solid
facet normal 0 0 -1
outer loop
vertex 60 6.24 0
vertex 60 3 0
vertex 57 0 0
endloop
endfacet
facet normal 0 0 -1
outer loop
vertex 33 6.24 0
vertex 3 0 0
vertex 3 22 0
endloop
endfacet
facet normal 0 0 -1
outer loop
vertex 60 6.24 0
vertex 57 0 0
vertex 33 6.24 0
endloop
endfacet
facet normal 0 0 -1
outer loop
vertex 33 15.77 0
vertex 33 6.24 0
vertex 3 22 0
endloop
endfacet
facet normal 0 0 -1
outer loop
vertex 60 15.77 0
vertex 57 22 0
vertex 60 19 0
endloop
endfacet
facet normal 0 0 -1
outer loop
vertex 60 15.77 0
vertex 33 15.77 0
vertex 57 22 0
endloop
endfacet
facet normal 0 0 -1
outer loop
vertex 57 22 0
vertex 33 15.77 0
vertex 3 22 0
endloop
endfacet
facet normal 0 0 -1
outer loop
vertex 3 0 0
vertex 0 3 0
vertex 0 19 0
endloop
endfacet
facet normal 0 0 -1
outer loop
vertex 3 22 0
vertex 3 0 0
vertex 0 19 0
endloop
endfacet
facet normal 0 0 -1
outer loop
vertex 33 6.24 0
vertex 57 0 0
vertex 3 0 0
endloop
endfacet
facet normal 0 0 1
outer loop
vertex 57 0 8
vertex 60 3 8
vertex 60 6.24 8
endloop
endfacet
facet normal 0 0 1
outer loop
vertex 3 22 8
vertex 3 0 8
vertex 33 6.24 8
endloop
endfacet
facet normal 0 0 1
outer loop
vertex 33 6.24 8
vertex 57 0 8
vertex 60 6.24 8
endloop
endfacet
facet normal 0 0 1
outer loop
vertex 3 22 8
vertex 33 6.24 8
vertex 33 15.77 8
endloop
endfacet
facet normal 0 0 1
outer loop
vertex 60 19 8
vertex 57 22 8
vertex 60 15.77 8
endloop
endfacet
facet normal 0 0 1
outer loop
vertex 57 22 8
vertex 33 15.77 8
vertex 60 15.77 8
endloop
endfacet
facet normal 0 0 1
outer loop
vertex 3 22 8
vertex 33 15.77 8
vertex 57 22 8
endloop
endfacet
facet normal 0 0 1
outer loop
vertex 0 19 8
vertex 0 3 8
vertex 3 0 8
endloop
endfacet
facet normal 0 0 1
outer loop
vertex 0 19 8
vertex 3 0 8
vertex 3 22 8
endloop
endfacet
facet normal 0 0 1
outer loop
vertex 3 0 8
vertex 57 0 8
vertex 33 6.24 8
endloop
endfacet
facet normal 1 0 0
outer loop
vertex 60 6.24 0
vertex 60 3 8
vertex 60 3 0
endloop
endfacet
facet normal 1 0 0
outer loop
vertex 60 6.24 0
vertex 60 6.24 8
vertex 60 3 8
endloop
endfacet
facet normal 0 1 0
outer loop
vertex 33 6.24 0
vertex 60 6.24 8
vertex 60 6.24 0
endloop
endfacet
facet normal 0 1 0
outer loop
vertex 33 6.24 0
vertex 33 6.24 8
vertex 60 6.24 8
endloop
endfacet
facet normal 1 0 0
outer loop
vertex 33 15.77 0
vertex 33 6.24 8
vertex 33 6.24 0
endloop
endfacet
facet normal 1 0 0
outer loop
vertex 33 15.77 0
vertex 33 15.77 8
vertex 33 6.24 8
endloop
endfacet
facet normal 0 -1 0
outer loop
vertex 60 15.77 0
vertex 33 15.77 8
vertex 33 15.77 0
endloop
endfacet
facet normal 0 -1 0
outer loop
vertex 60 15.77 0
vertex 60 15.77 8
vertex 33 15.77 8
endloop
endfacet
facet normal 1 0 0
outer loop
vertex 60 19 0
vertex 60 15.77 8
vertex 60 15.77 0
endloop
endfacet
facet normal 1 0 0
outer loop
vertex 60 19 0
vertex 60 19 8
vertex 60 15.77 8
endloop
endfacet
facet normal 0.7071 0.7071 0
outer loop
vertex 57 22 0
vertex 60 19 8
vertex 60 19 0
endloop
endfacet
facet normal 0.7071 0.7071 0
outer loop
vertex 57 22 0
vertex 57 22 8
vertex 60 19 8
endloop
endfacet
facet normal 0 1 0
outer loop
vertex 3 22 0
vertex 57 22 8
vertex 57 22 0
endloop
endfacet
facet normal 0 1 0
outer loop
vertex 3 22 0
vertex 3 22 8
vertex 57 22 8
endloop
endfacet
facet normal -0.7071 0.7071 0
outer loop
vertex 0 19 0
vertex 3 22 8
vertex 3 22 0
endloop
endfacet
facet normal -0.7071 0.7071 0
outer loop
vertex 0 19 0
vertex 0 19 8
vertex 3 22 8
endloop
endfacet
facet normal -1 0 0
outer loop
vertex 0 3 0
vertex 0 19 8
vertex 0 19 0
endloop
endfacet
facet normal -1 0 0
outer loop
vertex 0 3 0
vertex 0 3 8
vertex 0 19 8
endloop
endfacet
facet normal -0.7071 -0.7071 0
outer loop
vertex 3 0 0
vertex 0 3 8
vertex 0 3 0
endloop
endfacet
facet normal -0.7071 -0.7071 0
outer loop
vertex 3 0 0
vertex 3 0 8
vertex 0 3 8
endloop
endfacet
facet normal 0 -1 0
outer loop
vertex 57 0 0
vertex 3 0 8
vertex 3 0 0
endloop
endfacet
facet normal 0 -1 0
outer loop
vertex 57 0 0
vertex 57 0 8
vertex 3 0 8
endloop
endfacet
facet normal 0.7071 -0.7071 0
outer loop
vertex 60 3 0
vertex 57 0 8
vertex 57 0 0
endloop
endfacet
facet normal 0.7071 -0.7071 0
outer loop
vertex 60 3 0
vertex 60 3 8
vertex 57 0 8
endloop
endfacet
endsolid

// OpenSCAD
$fn = 32;

// ----------------------------------------------------------------------
// C washer: 60 x 22 mm plate with an open slot
// ----------------------------------------------------------------------

// --- parameters (mm) ---
profile_height = 8;       // extrusion height
profile_points = 12;      // points of the closed outline

profile = [[3, 0], [57, 0], [60, 3], [60, 6.24], [33, 6.24], [33, 15.77], [60, 15.77], [60, 19], [57, 22], [3, 22], [0, 19], [0, 3]];  // single closed polygon, 12 points, counter clockwise

// --- the one profile operation ---
linear_extrude(height = profile_height) polygon(points = profile);
